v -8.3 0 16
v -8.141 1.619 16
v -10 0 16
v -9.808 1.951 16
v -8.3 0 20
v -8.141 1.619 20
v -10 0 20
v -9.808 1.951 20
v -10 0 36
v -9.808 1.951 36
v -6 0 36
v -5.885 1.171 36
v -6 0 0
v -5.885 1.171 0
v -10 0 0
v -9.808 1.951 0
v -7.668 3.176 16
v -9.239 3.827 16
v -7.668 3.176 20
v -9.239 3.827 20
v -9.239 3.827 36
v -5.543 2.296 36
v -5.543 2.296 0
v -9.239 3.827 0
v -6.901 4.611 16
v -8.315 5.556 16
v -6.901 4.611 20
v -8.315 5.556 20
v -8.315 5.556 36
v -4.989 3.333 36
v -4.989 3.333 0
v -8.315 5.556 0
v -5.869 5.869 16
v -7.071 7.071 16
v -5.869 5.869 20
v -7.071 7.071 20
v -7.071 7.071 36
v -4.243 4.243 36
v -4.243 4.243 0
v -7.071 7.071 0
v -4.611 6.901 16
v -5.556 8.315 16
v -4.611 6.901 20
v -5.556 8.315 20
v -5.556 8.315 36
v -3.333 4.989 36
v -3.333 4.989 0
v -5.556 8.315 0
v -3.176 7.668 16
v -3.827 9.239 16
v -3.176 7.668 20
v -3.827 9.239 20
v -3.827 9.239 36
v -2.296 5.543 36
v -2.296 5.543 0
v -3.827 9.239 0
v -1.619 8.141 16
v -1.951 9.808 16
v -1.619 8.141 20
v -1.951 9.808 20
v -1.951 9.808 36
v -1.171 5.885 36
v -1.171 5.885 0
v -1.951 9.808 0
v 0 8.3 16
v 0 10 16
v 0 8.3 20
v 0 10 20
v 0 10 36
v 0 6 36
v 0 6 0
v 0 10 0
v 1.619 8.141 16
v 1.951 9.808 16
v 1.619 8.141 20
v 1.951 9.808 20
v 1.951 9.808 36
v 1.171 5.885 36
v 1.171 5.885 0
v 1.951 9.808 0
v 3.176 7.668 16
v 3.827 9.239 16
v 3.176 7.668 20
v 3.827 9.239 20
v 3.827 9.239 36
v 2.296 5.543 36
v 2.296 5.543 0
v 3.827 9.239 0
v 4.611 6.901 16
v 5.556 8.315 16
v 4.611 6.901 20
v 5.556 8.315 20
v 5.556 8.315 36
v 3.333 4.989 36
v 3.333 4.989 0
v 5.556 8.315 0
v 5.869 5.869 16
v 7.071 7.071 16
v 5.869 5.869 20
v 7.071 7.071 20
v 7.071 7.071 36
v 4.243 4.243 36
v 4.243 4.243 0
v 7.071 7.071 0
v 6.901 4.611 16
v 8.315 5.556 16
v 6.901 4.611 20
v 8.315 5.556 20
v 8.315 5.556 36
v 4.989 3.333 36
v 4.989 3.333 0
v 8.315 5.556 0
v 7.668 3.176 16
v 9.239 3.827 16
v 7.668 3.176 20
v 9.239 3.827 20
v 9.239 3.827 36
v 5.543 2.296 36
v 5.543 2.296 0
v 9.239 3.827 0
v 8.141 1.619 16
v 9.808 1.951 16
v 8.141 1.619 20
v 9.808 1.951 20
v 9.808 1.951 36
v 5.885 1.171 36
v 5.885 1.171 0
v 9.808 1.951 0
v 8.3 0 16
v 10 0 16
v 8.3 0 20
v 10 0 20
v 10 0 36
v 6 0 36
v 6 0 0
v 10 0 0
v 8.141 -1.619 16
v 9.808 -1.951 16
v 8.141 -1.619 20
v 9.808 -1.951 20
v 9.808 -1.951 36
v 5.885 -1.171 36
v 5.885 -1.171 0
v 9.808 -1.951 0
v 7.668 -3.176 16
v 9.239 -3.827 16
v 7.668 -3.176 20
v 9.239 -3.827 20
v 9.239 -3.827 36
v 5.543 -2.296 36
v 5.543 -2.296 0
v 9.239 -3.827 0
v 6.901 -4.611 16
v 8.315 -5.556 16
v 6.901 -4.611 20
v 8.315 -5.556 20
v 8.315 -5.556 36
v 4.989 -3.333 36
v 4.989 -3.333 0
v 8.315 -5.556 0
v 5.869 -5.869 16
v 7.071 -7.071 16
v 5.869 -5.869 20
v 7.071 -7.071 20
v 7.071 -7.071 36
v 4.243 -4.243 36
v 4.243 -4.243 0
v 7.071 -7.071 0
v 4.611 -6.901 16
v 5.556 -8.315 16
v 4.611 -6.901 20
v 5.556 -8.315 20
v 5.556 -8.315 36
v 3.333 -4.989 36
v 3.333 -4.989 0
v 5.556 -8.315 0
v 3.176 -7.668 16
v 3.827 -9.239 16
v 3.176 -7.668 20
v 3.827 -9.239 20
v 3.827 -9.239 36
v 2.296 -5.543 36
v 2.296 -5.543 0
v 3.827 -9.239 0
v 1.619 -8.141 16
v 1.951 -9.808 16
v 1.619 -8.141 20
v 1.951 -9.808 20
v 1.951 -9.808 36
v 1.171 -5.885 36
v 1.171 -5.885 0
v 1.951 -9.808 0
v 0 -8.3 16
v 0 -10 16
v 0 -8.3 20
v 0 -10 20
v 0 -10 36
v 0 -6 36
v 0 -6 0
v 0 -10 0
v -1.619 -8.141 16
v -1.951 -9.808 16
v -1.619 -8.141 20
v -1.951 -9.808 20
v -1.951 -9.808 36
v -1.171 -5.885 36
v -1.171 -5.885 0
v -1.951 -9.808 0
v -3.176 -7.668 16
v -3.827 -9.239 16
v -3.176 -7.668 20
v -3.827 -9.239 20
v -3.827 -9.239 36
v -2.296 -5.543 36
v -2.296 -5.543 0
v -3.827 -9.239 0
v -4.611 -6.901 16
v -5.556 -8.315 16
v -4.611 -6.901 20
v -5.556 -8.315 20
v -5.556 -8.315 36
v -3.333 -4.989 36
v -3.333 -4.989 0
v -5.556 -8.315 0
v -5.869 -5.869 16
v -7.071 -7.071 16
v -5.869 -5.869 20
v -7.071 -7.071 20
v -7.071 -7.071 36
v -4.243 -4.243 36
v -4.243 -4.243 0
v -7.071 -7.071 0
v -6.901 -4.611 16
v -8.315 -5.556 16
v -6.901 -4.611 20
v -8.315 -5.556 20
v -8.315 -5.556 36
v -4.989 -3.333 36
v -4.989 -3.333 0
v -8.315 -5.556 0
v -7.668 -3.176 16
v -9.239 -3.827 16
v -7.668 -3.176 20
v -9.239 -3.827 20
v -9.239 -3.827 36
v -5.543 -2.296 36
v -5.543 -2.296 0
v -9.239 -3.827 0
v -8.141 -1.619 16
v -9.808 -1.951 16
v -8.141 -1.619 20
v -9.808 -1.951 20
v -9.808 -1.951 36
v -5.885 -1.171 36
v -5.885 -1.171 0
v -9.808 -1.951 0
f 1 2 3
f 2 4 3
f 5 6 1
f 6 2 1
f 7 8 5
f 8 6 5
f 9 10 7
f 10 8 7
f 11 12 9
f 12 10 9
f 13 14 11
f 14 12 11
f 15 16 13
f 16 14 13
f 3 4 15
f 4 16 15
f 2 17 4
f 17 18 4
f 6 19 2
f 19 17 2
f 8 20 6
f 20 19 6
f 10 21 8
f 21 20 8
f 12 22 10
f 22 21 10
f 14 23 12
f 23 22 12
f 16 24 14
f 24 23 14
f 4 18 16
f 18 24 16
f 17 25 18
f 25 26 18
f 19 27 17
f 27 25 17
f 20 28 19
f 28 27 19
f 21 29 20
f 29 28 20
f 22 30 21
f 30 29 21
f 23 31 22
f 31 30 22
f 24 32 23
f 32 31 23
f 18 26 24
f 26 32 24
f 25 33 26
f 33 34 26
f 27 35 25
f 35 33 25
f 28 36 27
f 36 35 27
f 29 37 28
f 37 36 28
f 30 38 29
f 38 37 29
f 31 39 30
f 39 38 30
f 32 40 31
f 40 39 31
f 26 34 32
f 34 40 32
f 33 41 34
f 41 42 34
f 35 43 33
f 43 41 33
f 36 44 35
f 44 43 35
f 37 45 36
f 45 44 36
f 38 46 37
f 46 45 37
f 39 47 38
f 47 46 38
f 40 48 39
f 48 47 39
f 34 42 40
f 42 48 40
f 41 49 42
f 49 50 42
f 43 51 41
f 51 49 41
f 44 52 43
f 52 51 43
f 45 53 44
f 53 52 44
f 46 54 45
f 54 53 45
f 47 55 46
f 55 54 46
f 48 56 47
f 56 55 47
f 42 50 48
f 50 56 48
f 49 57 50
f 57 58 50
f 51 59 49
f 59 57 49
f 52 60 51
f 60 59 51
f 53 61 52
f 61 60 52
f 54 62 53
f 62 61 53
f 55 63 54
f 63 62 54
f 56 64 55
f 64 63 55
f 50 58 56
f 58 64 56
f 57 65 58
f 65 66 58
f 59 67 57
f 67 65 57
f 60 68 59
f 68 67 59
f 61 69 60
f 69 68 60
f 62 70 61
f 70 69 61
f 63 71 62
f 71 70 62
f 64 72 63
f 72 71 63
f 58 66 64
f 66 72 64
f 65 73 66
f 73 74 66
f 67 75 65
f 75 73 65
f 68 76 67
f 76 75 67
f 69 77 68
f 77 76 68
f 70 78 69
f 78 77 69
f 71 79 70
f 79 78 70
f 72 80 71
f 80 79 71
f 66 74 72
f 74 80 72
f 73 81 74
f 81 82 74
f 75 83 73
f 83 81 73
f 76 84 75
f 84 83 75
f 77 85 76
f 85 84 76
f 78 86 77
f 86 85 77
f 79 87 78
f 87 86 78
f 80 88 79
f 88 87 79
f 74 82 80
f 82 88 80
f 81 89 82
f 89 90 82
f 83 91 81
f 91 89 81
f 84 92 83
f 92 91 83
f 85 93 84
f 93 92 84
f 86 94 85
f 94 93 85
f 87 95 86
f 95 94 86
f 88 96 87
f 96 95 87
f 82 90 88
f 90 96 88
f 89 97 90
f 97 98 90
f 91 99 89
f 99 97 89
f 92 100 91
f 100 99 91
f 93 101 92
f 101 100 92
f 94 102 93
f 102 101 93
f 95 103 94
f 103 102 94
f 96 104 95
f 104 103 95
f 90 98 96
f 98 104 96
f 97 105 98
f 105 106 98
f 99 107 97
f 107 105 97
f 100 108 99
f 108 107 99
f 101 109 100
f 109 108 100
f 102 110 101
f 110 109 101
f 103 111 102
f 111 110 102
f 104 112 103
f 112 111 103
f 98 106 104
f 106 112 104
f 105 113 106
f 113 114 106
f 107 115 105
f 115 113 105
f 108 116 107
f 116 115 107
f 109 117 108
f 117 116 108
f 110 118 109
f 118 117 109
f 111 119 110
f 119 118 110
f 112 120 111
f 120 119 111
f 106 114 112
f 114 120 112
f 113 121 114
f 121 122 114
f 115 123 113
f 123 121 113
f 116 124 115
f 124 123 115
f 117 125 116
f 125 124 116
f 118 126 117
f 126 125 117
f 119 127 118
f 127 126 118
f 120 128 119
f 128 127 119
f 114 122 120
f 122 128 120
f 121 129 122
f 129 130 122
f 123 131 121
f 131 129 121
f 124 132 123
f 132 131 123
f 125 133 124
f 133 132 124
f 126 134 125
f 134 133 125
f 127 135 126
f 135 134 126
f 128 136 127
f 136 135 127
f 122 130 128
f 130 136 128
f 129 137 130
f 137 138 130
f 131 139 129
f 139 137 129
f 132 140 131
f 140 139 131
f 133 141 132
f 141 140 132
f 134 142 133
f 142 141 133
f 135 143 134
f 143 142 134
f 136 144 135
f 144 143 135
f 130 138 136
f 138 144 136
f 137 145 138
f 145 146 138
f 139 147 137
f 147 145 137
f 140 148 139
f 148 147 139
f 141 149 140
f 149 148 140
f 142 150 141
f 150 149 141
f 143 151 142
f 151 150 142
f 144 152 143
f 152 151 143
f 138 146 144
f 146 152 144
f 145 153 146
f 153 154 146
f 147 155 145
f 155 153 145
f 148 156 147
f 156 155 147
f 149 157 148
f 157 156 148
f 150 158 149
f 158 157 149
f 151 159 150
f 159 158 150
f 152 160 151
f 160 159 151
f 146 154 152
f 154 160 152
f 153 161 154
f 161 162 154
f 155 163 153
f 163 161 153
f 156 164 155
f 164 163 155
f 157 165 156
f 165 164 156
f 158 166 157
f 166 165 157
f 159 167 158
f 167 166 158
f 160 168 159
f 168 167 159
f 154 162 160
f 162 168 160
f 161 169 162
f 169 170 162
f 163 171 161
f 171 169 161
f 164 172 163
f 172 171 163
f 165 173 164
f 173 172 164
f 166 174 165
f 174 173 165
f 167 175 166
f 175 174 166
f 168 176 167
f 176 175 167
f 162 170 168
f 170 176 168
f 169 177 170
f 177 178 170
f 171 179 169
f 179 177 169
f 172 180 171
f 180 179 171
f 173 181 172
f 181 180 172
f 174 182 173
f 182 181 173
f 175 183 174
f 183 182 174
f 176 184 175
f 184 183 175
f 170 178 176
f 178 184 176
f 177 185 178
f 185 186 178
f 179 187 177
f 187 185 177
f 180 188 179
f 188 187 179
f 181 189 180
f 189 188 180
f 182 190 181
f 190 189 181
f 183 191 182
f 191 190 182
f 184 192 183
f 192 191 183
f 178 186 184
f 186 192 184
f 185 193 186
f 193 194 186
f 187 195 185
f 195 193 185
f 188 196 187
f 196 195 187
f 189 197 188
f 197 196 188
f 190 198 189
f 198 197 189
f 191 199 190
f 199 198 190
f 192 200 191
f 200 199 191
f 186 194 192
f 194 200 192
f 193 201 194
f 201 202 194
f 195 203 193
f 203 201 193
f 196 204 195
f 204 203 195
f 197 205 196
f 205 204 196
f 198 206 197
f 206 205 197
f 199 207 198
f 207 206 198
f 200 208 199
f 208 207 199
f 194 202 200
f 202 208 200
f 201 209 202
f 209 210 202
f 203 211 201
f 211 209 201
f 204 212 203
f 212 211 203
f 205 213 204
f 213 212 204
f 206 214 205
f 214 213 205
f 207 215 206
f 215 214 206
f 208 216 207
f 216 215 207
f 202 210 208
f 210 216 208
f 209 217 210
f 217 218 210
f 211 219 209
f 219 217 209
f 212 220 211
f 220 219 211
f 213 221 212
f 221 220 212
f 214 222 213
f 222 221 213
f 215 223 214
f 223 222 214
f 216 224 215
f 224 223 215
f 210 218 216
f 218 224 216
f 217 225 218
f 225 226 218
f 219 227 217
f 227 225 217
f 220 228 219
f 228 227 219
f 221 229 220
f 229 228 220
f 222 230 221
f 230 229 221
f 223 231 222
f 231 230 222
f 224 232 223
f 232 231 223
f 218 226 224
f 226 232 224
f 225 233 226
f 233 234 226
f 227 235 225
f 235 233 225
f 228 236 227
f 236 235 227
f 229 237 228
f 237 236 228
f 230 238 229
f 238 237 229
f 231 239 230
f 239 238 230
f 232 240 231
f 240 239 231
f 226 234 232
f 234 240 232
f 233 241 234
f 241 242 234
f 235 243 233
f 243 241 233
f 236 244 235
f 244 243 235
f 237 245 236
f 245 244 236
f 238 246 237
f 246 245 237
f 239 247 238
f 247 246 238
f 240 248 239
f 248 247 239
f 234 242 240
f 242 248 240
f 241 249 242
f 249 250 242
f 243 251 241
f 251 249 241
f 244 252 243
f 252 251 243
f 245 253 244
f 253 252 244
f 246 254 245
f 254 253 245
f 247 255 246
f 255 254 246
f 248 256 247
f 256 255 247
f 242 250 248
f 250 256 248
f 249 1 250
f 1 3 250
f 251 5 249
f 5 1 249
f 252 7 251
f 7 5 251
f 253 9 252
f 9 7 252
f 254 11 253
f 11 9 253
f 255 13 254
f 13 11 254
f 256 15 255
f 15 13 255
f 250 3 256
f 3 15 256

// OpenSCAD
$fn = 32;

// ----------------------------------------------------------------------
// Grooved revolve: stepped, bore R6
// ----------------------------------------------------------------------

// --- parameters (mm) ---
bore_r = 6;               // bore radius
outer_r = 10;             // outer radius of the body
total_h = 36;             // overall height, Z
wall = 4;                 // radial wall thickness
groove_w = 4;             // groove width
groove_d = 1.7;           // groove depth
grooves = 1;              // number of outer grooves

bbox_x = 2 * outer_r;  // full diameter
bore_d = 2 * bore_r;  // bore diameter
body_d = 2 * outer_r;  // body diameter
revolve_angle = 360;  // full turn around the Z axis

profile = [[6, 0], [10, 0], [10, 16], [8.3, 16], [8.3, 20], [10, 20], [10, 36], [6, 36]];  // primary outline, 8 points, counter clockwise

// --- the one profile operation ---
rotate_extrude(angle = revolve_angle) polygon(points = profile);
